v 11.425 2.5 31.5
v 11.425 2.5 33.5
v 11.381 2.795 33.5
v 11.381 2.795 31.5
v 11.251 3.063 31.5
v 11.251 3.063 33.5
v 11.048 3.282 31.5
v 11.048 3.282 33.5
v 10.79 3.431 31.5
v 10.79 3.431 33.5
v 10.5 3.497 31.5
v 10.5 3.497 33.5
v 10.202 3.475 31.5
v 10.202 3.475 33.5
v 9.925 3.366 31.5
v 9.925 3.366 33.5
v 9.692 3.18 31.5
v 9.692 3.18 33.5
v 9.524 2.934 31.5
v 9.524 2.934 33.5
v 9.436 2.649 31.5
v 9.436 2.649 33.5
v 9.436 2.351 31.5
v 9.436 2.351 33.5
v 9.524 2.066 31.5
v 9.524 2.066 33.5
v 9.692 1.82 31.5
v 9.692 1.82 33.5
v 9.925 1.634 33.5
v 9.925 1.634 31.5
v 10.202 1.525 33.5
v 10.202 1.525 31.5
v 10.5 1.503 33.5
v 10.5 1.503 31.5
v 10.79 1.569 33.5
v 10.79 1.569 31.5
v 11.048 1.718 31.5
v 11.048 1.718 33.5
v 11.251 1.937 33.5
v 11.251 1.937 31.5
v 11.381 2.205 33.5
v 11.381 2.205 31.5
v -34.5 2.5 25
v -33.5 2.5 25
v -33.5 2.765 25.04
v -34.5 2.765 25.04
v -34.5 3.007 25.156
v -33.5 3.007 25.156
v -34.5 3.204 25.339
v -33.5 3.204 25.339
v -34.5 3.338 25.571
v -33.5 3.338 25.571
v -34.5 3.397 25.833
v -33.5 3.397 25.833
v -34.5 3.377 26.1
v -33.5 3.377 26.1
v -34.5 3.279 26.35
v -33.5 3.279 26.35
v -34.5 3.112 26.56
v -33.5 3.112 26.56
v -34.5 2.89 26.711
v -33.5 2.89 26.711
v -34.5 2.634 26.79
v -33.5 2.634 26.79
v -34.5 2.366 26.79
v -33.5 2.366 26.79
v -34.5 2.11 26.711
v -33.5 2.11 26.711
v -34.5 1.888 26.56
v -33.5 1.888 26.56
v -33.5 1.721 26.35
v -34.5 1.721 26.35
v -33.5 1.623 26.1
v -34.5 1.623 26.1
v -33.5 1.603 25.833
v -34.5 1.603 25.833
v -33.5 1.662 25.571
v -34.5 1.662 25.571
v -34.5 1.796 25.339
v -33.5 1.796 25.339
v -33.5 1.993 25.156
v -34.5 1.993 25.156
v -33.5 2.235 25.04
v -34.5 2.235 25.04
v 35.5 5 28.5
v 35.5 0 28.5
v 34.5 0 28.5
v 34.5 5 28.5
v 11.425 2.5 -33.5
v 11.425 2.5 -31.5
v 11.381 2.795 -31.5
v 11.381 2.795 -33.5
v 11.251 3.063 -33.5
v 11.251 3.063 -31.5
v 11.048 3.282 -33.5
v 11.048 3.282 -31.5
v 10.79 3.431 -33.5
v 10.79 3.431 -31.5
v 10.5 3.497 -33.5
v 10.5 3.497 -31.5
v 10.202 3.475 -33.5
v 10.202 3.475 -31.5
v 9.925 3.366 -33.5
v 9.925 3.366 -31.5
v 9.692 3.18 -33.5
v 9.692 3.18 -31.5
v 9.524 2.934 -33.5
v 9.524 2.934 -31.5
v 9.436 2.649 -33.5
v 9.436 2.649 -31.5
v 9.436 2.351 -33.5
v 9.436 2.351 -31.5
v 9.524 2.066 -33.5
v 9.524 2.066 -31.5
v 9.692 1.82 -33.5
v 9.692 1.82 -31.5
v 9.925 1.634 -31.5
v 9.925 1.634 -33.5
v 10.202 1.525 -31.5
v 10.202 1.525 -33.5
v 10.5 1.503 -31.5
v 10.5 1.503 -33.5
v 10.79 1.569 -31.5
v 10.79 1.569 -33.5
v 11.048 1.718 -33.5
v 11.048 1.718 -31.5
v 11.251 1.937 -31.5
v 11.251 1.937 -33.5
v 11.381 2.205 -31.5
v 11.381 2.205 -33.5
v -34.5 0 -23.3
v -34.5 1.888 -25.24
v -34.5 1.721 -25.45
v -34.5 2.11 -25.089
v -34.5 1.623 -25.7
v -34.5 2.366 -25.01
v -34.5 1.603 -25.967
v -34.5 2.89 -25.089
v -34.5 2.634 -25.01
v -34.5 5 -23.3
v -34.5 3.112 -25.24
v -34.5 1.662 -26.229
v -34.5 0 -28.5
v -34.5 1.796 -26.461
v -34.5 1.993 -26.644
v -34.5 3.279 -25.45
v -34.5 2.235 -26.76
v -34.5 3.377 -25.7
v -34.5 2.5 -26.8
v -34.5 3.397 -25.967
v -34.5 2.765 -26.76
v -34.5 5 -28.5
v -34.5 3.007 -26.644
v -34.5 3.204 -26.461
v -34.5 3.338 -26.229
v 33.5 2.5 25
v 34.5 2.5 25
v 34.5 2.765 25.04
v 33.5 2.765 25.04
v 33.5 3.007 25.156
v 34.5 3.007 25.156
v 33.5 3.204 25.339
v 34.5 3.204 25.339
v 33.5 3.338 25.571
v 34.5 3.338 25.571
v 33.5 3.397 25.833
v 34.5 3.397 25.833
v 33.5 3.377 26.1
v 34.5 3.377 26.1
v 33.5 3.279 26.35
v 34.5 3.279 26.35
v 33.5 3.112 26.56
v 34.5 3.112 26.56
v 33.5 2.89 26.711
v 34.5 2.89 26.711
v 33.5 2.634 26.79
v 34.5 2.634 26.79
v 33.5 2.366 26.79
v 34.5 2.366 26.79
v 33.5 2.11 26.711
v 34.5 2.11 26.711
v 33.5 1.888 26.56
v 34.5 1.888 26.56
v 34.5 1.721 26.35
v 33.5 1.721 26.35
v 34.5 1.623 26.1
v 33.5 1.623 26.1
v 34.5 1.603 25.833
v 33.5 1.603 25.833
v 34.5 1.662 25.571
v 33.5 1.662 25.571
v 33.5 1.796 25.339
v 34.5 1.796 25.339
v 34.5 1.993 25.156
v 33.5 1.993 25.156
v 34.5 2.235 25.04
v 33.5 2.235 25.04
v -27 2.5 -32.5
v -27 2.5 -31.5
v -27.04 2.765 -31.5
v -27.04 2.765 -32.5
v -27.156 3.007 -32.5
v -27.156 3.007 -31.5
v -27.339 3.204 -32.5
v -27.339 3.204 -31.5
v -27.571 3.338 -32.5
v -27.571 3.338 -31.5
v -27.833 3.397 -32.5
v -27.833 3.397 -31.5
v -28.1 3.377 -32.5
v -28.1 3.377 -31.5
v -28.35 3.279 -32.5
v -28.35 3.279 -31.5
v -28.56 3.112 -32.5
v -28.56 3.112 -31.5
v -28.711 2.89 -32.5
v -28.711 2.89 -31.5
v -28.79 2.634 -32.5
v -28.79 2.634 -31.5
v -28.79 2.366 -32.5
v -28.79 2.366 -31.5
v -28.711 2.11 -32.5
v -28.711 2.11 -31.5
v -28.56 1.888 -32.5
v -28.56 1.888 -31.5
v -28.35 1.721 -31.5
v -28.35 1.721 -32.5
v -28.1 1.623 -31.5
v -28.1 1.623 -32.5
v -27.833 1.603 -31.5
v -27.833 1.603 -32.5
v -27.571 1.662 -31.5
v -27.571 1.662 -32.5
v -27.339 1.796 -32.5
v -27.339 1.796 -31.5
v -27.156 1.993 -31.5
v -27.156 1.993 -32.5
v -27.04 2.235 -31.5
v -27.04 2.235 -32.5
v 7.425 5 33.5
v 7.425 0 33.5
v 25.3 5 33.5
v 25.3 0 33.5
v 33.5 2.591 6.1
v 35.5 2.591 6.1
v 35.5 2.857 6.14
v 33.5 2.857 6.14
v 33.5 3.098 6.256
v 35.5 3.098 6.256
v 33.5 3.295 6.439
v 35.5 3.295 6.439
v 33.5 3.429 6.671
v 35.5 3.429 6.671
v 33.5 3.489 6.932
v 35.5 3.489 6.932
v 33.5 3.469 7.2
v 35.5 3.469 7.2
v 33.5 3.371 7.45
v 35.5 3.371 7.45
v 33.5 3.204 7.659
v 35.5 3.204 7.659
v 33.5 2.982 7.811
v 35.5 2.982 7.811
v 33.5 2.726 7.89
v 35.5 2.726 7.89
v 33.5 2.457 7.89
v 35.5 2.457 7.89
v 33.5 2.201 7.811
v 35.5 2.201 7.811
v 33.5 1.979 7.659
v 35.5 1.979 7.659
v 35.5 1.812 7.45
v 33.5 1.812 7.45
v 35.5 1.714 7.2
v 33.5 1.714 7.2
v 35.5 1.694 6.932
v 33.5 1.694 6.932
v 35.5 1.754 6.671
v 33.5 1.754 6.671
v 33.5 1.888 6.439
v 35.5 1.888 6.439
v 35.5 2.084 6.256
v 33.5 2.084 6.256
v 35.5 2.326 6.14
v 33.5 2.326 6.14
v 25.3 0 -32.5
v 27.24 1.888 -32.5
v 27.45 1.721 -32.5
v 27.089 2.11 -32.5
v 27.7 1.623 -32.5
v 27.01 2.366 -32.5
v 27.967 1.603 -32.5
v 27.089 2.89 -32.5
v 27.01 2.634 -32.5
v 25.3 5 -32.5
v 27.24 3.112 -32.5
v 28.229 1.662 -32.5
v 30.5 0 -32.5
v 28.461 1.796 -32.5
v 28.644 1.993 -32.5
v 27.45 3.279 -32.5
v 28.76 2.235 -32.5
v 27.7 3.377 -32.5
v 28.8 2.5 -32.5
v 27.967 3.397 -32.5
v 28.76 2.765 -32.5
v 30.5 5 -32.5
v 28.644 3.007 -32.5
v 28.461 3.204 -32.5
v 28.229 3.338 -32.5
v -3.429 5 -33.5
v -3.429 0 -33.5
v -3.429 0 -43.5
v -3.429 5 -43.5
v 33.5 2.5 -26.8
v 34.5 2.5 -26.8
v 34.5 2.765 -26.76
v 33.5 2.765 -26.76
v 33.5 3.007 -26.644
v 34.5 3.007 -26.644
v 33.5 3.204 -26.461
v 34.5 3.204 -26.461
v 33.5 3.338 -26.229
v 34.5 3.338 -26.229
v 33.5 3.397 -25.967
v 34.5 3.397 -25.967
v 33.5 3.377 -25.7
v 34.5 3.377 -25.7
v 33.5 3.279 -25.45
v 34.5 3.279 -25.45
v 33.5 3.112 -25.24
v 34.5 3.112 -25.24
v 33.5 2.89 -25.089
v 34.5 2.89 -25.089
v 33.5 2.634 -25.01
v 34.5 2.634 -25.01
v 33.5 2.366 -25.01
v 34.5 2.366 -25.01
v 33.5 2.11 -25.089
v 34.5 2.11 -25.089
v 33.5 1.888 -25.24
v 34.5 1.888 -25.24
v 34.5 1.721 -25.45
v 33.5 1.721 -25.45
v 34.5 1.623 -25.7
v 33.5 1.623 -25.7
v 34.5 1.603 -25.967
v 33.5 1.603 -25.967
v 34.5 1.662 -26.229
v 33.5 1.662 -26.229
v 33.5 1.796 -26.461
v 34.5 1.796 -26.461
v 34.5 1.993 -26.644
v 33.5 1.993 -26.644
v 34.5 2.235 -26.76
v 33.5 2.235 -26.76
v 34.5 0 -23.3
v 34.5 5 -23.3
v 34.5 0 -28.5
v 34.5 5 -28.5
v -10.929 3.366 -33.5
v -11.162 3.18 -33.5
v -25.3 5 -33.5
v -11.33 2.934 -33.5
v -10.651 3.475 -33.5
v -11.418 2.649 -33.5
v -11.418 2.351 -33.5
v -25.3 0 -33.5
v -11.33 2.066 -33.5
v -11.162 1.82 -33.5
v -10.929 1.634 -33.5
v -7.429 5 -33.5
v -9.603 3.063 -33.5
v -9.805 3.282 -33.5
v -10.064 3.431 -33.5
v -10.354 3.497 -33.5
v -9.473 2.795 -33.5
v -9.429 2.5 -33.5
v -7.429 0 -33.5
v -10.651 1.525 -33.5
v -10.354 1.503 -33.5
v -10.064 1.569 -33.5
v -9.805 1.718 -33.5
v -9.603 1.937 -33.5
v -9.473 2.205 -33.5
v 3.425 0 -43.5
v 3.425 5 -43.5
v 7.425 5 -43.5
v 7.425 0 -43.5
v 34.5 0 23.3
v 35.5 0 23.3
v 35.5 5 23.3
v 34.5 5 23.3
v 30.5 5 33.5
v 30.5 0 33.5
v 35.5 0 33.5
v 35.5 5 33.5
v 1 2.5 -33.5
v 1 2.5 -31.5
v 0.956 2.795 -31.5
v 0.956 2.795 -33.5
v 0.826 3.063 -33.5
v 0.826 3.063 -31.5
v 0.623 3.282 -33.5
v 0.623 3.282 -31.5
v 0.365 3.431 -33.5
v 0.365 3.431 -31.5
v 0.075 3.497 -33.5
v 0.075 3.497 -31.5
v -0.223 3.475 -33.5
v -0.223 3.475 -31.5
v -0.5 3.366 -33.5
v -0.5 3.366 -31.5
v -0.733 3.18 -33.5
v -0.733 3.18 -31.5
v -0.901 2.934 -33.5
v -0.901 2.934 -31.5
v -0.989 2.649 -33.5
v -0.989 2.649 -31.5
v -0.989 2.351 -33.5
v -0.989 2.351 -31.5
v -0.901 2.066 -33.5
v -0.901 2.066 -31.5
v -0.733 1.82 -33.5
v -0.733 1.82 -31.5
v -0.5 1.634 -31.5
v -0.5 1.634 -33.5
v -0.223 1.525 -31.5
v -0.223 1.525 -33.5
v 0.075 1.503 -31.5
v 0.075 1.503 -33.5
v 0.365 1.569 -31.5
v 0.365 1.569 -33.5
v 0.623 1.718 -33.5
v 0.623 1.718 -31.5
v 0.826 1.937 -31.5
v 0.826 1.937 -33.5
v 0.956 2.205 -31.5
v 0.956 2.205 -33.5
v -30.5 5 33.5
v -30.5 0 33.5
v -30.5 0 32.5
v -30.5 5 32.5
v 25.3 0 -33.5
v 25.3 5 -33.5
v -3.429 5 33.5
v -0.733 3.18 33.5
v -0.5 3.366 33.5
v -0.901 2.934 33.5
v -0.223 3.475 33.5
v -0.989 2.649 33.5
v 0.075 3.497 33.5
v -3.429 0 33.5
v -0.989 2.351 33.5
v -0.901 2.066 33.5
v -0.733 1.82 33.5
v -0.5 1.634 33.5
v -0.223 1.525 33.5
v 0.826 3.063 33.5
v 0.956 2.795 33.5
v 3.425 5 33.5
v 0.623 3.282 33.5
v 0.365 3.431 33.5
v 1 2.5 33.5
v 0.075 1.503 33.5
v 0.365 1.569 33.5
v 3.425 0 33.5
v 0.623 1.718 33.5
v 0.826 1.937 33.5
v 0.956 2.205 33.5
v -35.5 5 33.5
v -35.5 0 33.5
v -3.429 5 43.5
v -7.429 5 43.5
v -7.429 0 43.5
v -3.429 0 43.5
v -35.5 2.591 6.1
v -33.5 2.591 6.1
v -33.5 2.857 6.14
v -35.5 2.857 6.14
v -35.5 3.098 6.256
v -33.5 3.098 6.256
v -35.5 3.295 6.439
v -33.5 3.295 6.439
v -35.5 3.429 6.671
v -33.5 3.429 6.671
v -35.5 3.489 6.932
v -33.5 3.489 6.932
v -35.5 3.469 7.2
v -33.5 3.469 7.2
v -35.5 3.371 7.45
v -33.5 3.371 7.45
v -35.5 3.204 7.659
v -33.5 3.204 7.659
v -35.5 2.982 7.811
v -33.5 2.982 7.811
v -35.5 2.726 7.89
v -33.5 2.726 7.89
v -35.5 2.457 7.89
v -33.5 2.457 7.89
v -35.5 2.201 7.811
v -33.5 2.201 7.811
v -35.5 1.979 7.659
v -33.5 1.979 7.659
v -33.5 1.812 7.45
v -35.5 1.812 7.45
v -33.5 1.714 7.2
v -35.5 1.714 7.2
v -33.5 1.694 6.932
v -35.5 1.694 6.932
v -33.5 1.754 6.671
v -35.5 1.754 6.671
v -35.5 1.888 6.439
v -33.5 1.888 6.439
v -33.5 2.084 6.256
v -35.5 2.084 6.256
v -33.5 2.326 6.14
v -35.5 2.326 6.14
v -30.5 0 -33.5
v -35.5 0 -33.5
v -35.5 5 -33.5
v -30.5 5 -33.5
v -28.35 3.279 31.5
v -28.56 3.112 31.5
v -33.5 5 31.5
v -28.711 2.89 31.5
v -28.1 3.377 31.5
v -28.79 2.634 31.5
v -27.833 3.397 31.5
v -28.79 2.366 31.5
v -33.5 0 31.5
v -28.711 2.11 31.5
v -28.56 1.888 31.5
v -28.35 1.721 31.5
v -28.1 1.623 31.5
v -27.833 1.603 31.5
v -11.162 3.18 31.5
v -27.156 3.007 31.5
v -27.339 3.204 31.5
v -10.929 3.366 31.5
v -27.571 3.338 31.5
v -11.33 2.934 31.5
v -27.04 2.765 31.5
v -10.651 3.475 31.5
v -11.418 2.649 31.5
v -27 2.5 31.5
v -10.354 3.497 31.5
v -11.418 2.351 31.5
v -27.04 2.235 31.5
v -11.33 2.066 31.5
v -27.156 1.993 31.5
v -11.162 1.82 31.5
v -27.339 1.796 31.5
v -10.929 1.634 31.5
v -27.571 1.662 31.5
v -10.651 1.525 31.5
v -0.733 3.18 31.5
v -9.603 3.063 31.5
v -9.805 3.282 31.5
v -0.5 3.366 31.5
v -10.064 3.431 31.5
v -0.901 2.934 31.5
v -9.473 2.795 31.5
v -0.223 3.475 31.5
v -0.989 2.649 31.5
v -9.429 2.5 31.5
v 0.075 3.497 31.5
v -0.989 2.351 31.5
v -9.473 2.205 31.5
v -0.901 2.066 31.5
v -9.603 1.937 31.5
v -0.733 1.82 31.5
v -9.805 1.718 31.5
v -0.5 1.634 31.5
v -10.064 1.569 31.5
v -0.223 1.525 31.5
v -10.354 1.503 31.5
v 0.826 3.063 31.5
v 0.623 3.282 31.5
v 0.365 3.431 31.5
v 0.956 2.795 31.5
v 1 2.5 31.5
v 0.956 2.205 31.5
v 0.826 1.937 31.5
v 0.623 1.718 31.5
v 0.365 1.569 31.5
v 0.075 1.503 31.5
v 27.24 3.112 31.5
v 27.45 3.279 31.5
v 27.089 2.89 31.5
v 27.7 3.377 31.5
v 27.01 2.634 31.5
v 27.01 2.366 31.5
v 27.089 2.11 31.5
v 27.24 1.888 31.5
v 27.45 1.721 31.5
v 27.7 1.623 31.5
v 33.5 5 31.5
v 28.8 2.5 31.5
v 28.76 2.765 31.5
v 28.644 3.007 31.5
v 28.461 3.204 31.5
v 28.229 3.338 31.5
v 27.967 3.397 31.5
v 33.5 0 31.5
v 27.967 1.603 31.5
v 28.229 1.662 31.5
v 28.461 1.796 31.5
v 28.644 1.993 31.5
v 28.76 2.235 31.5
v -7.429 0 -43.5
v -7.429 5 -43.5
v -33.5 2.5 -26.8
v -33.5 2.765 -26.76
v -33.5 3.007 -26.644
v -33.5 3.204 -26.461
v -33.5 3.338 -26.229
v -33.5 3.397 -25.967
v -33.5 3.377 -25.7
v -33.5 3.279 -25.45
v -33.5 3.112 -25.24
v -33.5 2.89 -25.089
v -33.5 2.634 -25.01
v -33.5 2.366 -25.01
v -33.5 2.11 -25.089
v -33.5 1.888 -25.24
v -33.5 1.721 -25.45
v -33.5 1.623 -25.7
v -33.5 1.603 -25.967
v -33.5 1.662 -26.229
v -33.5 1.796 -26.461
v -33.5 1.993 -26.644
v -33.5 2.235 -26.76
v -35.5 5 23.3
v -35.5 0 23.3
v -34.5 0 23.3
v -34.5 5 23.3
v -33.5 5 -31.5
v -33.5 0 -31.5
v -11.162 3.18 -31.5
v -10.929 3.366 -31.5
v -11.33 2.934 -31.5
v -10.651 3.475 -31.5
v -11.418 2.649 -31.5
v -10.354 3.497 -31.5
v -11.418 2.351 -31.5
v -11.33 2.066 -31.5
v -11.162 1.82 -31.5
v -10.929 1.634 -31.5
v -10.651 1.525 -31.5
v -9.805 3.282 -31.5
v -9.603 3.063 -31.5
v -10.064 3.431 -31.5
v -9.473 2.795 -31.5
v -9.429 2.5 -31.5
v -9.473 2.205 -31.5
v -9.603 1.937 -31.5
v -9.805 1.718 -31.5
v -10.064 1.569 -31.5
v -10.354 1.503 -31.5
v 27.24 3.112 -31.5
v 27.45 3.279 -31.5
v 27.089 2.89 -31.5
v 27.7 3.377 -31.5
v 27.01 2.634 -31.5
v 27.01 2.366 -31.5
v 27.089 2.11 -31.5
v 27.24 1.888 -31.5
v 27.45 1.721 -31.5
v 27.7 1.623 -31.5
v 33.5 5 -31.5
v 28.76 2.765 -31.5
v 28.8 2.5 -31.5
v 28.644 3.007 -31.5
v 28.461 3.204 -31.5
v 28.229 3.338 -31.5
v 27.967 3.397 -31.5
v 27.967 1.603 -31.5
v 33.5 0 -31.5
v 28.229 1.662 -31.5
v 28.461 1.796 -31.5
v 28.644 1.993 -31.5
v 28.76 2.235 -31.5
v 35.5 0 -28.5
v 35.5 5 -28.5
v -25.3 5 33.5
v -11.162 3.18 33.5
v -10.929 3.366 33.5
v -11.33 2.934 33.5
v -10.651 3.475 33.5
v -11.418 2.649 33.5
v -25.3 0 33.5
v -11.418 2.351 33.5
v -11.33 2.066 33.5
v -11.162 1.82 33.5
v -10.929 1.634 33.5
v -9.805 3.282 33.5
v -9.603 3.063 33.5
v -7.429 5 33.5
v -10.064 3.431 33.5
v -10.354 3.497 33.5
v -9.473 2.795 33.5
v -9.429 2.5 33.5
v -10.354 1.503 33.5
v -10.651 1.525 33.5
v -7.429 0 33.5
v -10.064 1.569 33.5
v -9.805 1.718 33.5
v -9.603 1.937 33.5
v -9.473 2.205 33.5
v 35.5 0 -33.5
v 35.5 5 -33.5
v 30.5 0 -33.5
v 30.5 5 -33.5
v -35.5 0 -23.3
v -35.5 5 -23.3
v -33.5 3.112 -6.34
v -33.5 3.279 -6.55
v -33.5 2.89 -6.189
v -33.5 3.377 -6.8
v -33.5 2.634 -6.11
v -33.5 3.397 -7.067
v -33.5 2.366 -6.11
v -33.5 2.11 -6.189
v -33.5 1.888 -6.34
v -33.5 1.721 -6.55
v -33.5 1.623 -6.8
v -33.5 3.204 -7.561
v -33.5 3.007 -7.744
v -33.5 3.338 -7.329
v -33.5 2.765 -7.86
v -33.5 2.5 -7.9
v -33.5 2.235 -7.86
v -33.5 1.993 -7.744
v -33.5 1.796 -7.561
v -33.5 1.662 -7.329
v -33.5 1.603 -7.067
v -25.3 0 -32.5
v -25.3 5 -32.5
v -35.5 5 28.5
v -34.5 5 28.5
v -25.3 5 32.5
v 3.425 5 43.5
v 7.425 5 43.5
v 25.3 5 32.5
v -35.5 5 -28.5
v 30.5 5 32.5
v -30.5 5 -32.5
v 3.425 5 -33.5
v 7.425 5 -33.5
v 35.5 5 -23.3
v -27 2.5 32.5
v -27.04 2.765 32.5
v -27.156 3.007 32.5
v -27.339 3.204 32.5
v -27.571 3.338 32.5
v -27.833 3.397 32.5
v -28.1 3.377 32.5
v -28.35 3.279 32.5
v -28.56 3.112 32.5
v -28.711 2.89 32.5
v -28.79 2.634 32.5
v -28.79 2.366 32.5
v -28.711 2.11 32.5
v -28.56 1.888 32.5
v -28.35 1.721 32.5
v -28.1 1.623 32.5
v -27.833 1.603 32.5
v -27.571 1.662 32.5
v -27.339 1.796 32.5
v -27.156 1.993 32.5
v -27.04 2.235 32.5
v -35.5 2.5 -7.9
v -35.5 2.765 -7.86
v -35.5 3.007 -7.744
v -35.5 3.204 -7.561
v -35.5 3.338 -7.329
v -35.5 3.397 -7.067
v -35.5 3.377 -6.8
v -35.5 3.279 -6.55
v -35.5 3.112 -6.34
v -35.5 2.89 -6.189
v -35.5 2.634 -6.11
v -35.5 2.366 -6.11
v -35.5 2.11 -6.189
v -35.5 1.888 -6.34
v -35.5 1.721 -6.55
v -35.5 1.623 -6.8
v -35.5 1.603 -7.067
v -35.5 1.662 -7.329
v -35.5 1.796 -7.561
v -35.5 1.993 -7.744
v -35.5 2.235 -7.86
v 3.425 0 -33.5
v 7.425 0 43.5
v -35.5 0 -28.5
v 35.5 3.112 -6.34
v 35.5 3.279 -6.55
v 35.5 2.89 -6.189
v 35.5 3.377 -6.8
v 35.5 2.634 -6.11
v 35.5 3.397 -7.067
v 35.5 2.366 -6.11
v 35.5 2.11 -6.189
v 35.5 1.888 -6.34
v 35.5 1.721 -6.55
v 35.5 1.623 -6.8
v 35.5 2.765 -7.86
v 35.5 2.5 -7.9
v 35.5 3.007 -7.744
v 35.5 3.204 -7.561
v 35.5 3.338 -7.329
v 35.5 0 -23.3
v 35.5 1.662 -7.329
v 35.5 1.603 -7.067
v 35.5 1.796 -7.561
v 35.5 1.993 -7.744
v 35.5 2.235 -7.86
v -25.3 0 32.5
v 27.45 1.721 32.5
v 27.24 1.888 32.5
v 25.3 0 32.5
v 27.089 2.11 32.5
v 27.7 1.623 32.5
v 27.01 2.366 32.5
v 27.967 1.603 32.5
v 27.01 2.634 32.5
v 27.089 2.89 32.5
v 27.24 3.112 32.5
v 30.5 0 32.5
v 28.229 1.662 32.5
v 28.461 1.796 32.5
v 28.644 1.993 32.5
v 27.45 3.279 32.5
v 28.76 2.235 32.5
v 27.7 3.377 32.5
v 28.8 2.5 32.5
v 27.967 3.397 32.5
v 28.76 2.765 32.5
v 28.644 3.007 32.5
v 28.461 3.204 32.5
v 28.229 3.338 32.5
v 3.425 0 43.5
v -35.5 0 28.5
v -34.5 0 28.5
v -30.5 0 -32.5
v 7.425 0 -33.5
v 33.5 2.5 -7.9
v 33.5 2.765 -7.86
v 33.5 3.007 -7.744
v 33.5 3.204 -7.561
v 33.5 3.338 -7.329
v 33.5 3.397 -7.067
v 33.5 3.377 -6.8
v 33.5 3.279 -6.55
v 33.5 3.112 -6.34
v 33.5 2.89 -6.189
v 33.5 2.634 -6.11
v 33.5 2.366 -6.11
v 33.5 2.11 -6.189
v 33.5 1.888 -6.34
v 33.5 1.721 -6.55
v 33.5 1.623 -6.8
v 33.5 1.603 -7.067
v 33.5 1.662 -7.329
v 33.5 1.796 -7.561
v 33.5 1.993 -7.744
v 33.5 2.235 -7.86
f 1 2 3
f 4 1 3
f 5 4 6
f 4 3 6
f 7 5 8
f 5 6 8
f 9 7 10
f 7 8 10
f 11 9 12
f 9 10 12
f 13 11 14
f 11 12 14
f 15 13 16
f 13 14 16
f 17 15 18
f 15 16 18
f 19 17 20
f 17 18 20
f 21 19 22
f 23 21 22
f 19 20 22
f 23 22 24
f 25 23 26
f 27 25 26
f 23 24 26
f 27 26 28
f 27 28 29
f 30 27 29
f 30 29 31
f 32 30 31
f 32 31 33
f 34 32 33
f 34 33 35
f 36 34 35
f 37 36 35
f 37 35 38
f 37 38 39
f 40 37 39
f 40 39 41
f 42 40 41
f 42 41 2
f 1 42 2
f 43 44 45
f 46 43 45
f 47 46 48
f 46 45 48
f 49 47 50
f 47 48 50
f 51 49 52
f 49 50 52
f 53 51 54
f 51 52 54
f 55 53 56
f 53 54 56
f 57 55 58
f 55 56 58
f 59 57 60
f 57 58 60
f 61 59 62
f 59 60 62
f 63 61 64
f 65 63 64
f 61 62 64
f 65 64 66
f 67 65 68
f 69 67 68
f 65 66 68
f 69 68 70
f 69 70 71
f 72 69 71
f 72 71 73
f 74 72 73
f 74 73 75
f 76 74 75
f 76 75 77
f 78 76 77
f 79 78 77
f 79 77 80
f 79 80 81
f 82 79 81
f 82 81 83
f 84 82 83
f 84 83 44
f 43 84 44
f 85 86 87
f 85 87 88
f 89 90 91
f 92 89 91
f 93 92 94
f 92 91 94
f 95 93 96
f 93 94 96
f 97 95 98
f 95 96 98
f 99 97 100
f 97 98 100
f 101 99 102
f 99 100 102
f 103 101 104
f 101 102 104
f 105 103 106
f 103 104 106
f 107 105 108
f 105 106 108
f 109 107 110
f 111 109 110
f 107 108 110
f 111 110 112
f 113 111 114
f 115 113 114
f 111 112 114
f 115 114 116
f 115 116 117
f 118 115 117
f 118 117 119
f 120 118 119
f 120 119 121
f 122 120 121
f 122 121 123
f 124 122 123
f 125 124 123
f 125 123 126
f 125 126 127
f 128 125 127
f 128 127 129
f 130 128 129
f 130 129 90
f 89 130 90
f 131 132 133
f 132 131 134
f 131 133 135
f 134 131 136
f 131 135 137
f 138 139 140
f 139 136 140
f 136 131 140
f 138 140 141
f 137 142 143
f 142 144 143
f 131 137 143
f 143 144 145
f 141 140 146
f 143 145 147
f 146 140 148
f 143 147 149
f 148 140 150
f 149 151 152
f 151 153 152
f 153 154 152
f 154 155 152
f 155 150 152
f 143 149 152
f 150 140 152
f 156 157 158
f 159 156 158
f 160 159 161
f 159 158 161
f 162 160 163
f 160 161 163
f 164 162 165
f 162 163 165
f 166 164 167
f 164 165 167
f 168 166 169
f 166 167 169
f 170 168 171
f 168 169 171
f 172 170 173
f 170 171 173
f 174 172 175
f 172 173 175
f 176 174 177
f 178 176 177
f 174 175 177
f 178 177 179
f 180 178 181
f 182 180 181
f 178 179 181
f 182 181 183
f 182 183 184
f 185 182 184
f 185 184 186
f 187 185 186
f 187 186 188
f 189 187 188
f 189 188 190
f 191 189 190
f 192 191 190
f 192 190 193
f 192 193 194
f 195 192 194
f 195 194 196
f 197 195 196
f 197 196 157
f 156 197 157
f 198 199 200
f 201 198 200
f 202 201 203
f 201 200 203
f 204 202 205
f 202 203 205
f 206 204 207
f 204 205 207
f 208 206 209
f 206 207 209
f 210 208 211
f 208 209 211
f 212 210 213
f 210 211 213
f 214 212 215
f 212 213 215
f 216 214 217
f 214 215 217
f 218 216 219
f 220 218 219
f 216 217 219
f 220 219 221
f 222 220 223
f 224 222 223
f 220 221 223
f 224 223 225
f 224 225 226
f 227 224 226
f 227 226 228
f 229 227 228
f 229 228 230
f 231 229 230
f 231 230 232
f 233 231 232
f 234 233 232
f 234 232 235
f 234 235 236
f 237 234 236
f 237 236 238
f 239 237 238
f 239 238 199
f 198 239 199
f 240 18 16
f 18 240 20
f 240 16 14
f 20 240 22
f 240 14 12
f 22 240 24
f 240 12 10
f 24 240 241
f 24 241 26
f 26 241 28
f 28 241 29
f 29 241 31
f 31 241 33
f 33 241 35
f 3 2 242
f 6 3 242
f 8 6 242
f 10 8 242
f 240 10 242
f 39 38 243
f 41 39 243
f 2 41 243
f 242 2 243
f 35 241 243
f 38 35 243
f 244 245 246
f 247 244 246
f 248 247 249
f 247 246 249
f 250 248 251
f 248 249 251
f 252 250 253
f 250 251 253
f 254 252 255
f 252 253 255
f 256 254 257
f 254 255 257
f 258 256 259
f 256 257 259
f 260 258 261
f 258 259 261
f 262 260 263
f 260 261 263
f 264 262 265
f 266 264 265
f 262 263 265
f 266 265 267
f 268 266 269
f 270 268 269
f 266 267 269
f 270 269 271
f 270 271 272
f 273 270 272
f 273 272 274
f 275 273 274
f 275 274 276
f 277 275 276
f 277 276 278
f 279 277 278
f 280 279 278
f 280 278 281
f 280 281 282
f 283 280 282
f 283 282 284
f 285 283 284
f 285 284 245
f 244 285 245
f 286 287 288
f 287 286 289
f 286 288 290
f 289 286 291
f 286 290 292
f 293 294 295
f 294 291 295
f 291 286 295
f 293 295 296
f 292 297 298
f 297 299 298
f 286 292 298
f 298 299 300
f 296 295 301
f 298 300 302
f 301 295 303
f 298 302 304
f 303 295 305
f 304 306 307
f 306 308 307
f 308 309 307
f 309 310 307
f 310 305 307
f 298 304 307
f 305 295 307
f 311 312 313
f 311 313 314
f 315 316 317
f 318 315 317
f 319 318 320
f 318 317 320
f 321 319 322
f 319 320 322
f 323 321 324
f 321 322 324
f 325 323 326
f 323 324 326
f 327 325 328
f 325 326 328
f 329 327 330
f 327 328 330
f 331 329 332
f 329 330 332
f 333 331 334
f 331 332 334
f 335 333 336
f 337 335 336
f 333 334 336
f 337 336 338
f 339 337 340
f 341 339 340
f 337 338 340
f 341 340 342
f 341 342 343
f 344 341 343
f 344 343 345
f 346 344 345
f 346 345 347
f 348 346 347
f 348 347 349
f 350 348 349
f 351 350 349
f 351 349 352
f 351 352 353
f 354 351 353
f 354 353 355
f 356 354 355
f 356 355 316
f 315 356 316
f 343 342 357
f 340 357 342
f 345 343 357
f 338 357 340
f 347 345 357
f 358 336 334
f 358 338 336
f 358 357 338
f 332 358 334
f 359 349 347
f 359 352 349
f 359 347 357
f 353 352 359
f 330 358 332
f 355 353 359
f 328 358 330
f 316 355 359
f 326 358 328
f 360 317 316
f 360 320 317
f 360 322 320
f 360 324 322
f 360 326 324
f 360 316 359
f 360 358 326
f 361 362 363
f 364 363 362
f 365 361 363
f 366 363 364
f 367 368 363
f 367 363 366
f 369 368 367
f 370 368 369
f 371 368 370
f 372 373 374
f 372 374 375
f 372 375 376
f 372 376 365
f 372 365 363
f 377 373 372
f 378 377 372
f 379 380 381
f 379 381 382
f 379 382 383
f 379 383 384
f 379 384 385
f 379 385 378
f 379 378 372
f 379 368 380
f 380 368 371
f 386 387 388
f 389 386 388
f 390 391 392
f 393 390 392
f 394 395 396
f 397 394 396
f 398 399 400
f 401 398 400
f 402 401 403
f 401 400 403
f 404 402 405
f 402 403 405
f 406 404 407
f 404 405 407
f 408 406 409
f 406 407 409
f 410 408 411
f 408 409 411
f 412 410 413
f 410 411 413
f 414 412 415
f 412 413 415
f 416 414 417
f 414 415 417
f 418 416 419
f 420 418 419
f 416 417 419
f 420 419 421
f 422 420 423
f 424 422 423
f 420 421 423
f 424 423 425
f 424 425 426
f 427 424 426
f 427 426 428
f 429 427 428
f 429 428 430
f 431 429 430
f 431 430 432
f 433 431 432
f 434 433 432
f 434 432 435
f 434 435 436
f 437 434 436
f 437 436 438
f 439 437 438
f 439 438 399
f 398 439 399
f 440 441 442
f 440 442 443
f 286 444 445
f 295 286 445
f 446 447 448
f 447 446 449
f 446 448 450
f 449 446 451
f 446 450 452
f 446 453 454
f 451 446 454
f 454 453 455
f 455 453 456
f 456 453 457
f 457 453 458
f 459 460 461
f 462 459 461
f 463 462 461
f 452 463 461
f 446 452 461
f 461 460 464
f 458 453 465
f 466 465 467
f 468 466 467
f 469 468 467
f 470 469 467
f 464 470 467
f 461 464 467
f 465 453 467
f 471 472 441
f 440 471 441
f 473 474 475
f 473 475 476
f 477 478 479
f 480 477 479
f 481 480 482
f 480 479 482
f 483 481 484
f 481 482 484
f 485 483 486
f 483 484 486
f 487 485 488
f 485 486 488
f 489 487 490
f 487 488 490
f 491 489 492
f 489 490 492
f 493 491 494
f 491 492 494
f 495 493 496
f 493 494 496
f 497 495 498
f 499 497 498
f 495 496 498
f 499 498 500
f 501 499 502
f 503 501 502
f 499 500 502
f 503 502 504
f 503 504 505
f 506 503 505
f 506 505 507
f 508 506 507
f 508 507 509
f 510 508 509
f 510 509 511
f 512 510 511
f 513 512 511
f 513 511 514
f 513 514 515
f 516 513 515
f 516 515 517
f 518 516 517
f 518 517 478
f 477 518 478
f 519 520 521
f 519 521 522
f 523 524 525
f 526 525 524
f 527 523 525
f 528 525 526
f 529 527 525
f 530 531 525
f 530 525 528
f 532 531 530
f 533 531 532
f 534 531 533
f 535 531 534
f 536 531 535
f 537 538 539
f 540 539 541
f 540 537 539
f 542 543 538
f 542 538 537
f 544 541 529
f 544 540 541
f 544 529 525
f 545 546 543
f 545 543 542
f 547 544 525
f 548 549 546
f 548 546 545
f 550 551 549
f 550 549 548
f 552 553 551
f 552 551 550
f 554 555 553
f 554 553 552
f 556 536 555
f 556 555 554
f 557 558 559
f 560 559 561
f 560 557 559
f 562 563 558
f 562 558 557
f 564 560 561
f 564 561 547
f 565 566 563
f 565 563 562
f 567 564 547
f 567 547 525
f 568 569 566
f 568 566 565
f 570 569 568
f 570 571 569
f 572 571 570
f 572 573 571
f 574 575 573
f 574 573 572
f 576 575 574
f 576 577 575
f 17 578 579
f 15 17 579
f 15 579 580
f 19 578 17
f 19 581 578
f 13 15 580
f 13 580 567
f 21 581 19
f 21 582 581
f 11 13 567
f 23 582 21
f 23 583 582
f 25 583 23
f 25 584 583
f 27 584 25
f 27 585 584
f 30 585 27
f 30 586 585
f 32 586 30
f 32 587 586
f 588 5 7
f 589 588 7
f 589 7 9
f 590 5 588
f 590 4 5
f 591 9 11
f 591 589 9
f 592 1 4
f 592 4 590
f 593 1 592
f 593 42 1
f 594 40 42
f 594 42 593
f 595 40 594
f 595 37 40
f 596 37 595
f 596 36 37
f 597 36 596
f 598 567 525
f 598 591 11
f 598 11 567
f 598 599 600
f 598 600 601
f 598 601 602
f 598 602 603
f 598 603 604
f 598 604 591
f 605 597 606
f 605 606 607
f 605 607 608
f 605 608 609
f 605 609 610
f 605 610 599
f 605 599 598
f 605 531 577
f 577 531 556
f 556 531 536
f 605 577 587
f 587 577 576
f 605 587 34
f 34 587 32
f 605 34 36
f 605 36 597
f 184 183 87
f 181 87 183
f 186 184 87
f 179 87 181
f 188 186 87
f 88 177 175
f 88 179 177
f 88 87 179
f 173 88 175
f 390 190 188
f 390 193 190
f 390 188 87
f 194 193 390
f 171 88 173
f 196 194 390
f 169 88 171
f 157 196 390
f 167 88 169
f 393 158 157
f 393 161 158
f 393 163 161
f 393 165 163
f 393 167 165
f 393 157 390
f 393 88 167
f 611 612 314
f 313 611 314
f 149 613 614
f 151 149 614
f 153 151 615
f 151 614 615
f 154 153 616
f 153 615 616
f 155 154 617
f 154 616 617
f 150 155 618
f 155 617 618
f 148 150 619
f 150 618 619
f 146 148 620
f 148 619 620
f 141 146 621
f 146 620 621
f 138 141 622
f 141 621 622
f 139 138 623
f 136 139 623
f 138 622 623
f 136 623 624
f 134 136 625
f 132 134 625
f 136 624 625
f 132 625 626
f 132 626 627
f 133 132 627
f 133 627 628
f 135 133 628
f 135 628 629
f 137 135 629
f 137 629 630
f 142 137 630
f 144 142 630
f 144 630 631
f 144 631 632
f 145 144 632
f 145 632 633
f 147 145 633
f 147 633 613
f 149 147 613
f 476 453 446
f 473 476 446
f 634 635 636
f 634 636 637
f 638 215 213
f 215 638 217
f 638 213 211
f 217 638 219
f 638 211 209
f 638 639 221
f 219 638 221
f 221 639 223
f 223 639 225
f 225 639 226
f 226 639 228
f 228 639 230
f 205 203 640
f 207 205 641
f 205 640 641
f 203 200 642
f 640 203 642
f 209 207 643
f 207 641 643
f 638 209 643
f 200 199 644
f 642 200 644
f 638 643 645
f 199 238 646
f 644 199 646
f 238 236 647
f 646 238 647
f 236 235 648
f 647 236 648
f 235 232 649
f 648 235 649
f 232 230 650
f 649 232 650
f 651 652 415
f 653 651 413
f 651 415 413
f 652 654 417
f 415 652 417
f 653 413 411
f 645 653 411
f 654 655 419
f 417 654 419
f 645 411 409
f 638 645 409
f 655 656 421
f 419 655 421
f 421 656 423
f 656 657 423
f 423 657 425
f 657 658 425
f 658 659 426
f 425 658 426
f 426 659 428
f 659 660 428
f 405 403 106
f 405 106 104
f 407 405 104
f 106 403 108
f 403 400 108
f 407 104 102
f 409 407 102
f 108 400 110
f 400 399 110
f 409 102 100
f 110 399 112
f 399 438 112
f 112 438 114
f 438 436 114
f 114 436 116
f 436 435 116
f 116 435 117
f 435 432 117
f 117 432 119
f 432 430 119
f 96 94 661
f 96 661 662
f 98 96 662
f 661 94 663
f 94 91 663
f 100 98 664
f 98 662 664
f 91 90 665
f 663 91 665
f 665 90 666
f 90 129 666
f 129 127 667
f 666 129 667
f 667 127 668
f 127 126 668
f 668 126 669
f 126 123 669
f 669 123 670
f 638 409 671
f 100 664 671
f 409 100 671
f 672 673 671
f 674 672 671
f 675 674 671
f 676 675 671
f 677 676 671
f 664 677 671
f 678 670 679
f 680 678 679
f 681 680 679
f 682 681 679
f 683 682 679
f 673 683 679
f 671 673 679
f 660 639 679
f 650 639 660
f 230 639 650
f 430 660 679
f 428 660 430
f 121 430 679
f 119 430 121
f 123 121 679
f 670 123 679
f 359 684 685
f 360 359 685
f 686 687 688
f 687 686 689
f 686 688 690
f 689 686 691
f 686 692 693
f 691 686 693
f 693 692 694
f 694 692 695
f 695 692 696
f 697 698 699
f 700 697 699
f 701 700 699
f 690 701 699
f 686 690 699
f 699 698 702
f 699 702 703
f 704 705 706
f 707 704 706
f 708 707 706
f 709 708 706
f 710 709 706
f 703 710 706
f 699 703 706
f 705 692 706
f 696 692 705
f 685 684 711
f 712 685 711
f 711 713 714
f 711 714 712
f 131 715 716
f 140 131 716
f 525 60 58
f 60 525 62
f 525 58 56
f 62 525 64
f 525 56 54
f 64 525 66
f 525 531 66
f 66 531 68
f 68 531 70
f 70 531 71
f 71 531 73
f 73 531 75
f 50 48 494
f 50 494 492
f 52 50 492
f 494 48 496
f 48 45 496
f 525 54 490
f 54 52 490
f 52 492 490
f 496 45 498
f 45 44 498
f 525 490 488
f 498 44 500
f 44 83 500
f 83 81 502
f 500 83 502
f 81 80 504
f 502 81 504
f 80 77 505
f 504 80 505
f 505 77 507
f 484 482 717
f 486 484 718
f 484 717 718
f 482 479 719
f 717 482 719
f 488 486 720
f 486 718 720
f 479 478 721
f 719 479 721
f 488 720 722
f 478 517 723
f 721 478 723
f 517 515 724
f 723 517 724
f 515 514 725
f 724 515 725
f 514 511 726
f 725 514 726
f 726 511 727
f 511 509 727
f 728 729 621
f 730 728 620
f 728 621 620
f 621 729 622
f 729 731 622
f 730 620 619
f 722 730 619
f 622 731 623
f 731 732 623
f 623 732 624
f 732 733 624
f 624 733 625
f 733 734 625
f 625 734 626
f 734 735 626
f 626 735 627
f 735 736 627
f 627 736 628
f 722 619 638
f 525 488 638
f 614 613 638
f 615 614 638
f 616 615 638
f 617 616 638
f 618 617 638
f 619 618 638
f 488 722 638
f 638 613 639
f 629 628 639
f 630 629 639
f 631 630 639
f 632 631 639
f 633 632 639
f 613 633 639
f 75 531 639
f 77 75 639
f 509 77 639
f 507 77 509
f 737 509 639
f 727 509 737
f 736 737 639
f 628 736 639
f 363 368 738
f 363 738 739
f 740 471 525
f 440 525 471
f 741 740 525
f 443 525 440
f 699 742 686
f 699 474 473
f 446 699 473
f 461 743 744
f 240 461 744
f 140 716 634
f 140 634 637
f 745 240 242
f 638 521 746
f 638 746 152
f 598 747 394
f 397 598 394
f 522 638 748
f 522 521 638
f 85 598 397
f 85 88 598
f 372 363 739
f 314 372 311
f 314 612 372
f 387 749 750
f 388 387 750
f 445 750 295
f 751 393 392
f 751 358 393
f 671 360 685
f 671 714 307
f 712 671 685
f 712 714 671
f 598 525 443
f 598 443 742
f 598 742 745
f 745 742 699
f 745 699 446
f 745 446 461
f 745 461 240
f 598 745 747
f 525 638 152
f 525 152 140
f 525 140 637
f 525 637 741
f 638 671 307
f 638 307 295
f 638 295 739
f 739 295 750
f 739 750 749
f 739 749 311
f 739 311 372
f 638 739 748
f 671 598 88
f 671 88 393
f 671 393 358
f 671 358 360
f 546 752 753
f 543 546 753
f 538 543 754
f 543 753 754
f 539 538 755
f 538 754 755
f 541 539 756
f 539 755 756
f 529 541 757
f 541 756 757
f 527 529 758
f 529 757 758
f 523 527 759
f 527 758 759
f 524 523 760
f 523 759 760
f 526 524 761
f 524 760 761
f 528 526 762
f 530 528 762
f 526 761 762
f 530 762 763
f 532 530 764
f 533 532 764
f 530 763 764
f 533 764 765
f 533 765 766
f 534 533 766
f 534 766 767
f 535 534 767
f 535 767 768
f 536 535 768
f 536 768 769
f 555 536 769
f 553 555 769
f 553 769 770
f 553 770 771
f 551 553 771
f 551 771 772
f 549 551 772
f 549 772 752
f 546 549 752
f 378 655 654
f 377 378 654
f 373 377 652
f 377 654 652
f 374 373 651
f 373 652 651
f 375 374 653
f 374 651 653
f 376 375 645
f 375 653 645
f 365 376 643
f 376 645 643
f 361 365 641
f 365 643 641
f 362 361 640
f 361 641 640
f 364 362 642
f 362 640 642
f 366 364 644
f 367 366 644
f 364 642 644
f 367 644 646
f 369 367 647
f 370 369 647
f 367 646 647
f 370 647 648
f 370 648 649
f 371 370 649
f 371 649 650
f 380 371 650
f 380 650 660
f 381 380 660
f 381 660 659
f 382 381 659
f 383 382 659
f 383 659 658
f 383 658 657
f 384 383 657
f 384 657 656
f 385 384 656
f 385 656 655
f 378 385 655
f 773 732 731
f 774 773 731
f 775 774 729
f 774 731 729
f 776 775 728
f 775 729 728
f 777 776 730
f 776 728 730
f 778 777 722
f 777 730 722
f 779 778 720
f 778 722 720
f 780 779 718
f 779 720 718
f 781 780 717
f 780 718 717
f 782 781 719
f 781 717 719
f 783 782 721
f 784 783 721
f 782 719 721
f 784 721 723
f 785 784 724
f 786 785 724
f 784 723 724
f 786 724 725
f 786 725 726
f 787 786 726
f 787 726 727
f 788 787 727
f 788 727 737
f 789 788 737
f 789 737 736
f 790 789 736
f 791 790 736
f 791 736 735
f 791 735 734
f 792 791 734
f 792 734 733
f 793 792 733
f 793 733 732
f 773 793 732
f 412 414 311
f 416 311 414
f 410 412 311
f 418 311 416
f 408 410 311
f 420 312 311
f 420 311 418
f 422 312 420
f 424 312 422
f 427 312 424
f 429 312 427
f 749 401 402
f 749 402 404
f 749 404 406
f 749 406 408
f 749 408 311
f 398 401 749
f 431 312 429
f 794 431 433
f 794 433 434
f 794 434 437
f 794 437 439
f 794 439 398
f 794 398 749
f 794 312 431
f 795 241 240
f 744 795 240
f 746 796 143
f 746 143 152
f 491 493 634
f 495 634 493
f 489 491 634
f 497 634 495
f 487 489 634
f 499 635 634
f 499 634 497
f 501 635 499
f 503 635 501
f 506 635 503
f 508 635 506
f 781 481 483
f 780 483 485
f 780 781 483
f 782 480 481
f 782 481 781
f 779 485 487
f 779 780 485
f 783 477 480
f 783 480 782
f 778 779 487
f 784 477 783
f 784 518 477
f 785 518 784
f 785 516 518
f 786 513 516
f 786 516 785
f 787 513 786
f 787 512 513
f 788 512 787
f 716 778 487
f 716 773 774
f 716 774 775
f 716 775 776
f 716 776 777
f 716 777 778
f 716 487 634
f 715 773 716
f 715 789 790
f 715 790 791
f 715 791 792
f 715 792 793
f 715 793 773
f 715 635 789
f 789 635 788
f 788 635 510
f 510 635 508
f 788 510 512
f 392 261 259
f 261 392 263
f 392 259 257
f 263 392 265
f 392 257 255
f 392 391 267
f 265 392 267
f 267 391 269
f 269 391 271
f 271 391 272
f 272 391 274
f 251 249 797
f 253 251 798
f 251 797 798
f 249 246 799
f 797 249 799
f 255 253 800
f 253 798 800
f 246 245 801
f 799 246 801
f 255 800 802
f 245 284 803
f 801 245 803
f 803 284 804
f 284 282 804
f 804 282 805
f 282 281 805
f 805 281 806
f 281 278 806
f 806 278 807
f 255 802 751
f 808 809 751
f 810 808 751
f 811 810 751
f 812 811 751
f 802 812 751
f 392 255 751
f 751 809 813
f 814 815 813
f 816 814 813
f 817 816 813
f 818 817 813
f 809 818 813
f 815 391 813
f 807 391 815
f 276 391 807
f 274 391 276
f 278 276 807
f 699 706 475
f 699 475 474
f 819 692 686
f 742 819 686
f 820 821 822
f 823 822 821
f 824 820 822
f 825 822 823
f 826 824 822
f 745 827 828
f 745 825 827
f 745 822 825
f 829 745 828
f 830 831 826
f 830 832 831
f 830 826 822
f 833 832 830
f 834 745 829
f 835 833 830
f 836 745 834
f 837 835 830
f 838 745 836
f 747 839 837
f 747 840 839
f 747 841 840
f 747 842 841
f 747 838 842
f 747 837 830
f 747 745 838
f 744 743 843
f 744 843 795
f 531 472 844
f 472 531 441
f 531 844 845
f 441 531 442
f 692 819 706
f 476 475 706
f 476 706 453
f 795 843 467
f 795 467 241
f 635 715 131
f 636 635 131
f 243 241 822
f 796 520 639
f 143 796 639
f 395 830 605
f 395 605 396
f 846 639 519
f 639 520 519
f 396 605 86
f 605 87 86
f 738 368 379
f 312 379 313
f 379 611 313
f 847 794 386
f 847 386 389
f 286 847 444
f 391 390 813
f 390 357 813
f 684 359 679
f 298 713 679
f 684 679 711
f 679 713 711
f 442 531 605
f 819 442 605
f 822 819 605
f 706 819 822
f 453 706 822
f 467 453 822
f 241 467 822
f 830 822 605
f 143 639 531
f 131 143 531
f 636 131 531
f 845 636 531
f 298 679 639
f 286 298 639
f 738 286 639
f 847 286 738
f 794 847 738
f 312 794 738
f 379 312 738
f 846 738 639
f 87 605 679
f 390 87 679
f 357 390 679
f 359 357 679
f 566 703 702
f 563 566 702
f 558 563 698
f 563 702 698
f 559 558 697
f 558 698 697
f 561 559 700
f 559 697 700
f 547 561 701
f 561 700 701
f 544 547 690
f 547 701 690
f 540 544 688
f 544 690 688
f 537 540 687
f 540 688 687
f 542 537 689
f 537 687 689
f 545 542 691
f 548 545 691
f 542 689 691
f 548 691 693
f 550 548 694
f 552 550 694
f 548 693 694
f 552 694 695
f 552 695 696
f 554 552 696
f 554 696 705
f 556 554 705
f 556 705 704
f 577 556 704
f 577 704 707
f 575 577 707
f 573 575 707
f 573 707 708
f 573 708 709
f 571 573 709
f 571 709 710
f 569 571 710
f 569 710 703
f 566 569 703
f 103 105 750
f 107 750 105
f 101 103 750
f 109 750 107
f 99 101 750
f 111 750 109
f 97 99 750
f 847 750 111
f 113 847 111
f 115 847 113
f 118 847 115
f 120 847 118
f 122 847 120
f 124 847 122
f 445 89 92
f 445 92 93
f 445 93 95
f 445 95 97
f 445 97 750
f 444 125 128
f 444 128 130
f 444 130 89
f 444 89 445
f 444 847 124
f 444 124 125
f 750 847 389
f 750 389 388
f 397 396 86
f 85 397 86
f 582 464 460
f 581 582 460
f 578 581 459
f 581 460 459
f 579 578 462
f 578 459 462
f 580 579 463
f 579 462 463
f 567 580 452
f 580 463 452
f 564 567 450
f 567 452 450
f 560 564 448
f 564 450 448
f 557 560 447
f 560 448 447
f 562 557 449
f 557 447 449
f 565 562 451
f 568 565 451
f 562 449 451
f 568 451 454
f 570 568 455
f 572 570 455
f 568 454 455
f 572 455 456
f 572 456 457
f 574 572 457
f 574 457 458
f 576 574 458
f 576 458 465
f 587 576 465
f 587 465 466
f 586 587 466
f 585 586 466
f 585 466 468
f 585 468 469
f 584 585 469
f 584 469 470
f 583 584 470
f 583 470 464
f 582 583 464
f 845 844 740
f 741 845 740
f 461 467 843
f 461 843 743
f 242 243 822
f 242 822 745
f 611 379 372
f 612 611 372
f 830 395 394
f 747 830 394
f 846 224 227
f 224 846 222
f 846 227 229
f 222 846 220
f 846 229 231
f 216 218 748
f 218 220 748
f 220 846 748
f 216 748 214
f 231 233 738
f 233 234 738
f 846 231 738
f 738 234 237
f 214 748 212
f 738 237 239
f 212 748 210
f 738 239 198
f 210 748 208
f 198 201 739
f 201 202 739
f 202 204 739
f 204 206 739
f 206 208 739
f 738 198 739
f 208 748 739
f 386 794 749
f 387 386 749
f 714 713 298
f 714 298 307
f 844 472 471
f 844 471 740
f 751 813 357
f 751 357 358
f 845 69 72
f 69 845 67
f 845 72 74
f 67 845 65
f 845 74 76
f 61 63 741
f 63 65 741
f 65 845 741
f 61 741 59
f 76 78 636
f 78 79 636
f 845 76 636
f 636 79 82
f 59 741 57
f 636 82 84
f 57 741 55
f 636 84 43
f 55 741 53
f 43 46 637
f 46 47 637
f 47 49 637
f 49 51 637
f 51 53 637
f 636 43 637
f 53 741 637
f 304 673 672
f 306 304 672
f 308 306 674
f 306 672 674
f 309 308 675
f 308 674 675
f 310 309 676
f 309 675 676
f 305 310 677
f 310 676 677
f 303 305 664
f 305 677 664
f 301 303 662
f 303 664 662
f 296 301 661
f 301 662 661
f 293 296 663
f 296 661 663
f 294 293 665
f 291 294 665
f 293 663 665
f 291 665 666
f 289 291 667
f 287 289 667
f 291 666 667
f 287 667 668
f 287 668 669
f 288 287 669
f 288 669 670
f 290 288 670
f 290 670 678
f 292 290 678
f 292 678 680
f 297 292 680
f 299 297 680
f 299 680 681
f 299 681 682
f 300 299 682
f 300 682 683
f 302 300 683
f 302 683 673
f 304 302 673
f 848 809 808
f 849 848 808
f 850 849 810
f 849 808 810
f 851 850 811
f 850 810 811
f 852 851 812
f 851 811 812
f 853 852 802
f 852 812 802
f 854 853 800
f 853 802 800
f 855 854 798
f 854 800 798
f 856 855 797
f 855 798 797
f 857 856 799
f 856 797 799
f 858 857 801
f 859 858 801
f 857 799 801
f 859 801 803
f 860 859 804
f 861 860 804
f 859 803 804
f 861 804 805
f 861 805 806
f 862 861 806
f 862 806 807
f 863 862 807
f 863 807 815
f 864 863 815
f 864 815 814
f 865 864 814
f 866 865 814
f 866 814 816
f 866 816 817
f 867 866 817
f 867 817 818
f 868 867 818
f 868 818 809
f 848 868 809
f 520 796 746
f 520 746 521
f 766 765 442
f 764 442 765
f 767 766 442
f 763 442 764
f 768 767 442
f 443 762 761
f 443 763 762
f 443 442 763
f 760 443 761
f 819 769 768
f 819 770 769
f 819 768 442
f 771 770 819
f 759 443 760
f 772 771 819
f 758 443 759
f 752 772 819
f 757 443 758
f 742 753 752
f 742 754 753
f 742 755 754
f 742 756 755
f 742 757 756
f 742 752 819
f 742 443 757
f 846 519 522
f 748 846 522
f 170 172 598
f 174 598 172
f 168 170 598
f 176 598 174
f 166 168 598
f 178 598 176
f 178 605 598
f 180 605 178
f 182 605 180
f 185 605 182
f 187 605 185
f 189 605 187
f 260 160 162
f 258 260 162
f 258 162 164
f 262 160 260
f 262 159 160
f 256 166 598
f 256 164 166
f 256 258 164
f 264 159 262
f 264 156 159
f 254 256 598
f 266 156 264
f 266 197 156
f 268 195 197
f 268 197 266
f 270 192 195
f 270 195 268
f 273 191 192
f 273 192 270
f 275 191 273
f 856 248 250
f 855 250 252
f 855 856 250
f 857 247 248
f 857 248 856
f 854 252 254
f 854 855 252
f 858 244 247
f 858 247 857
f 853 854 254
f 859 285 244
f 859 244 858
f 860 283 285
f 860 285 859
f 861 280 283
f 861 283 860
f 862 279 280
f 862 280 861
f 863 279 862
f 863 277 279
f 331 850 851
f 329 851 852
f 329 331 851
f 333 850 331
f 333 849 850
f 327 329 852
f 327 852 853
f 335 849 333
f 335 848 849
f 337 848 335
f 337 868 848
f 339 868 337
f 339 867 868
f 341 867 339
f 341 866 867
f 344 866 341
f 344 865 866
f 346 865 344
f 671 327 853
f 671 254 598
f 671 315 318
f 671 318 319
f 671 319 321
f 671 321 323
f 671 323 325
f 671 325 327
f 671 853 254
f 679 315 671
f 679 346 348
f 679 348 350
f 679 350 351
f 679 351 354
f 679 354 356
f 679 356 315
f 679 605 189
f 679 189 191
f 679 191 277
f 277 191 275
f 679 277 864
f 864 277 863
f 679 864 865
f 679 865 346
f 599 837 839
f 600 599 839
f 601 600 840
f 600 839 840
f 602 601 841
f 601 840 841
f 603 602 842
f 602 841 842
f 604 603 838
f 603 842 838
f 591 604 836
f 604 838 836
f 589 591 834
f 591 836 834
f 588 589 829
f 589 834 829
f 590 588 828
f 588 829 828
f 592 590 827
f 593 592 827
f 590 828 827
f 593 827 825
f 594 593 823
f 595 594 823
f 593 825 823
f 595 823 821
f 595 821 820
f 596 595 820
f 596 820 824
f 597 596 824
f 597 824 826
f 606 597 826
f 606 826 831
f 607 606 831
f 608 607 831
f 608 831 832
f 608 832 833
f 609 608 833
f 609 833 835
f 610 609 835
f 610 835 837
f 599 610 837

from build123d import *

# Parameters (mm, degrees)
SKETCH1_W           = 71
SKETCH1_H           = 67
SKETCH1_W_2         = 67
SKETCH1_H_2         = 63
BOSS_EXTRUDE1_DEPTH = 5
SKETCH2_R           = 0.9
CUT_EXTRUDE1_DEPTH  = 121
SKETCH3_R           = 1
CUT_EXTRUDE2_DEPTH  = 90
SKETCH4_W           = 4
SKETCH4_H           = 5
BOSS_EXTRUDE2_DEPTH = 10
SKETCH5_R           = 1
CUT_EXTRUDE3_DEPTH  = 109
SKETCH9_W           = 5.2
SKETCH9_H           = 5
CUT_EXTRUDE6_DEPTH  = 1
SKETCH10_W          = 5.2
SKETCH10_H          = 5
CUT_EXTRUDE7_DEPTH  = 1
SKETCH11_R          = 0.9
CUT_EXTRUDE8_DEPTH  = 81
SKETCH12_R          = 0.9
CUT_EXTRUDE9_DEPTH  = 81


with BuildPart() as part:
    # Sketch1 → Boss-Extrude1 (new body)
    with BuildSketch(Plane(origin=(0, 0, 0), x_dir=(1, 0, 0), z_dir=(0, 1, 0))):
        Rectangle(SKETCH1_W, SKETCH1_H)
        Rectangle(SKETCH1_W_2, SKETCH1_H_2, mode=Mode.SUBTRACT)
    extrude(amount=BOSS_EXTRUDE1_DEPTH)

    # Sketch2 → Cut-Extrude1 (cut)
    with BuildSketch(Plane(origin=(35.5, 0, 0), x_dir=(0, 0, -1), z_dir=(1, 0, 0))):
        with Locations((-6.999701476, 2.591425228)):
            Circle(SKETCH2_R)
        with Locations((7, 2.5)):
            Circle(SKETCH2_R)
    extrude(amount=-CUT_EXTRUDE1_DEPTH, mode=Mode.SUBTRACT)

    # Sketch3 → Cut-Extrude2 (cut)
    with BuildSketch(Plane.XY.offset(33.5)):
        with Locations((0, 2.5)):
            Circle(SKETCH3_R)
    extrude(amount=-CUT_EXTRUDE2_DEPTH, mode=Mode.SUBTRACT)

    # Sketch4 → Boss-Extrude2 (add)
    with BuildSketch(Plane.XY.offset(33.5)):
        with Locations((5.425, 2.5)):
            Rectangle(SKETCH4_W, SKETCH4_H)
        with Locations((-5.428919328, 2.5)):
            Rectangle(SKETCH4_W, SKETCH4_H)
    boss_extrude2 = extrude(amount=BOSS_EXTRUDE2_DEPTH)

    # Mirror1: Boss-Extrude2 across plane
    add(boss_extrude2.mirror(Plane.XY))

    # Sketch5 → Cut-Extrude3 (cut)
    with BuildSketch(Plane.XY.offset(33.5)):
        with Locations((-10.428919328, 2.5)):
            Circle(SKETCH5_R)
        with Locations((10.425, 2.5)):
            Circle(SKETCH5_R)
    extrude(amount=-CUT_EXTRUDE3_DEPTH, mode=Mode.SUBTRACT)

    # Sketch9 → Cut-Extrude6 (cut)
    with BuildSketch(Plane.XY.offset(33.5)):
        with Locations((-27.9, 2.5)):
            Rectangle(SKETCH9_W, SKETCH9_H)
        with Locations((27.9, 2.5)):
            Rectangle(SKETCH9_W, SKETCH9_H)
    cut_extrude6 = extrude(amount=-CUT_EXTRUDE6_DEPTH, mode=Mode.SUBTRACT)

    # Sketch10 → Cut-Extrude7 (cut)
    with BuildSketch(Plane(origin=(35.5, 0, 0), x_dir=(0, 0, -1), z_dir=(1, 0, 0))):
        with Locations((-25.9, 2.5)):
            Rectangle(SKETCH10_W, SKETCH10_H)
        with Locations((25.9, 2.5)):
            Rectangle(SKETCH10_W, SKETCH10_H)
    cut_extrude7 = extrude(amount=-CUT_EXTRUDE7_DEPTH, mode=Mode.SUBTRACT)

    # Mirror2: Cut-Extrude7 across plane
    add(cut_extrude7.mirror(Plane(origin=(0, 0, 0), x_dir=(0, 0, 1), z_dir=(1, 0, 0))), mode=Mode.SUBTRACT)

    # Mirror3: Cut-Extrude6 across plane
    add(cut_extrude6.mirror(Plane.XY), mode=Mode.SUBTRACT)

    # Sketch11 → Cut-Extrude8 (cut)
    with BuildSketch(Plane(origin=(34.5, 0, 0), x_dir=(0, 0, -1), z_dir=(1, 0, 0))):
        with Locations((25.9, 2.5)):
            Circle(SKETCH11_R)
        with Locations((-25.9, 2.5)):
            Circle(SKETCH11_R)
    extrude(amount=-CUT_EXTRUDE8_DEPTH, mode=Mode.SUBTRACT)

    # Sketch12 → Cut-Extrude9 (cut)
    with BuildSketch(Plane.XY.offset(32.5)):
        with Locations((27.9, 2.5)):
            Circle(SKETCH12_R)
        with Locations((-27.9, 2.5)):
            Circle(SKETCH12_R)
    extrude(amount=-CUT_EXTRUDE9_DEPTH, mode=Mode.SUBTRACT)


solid = part.part
